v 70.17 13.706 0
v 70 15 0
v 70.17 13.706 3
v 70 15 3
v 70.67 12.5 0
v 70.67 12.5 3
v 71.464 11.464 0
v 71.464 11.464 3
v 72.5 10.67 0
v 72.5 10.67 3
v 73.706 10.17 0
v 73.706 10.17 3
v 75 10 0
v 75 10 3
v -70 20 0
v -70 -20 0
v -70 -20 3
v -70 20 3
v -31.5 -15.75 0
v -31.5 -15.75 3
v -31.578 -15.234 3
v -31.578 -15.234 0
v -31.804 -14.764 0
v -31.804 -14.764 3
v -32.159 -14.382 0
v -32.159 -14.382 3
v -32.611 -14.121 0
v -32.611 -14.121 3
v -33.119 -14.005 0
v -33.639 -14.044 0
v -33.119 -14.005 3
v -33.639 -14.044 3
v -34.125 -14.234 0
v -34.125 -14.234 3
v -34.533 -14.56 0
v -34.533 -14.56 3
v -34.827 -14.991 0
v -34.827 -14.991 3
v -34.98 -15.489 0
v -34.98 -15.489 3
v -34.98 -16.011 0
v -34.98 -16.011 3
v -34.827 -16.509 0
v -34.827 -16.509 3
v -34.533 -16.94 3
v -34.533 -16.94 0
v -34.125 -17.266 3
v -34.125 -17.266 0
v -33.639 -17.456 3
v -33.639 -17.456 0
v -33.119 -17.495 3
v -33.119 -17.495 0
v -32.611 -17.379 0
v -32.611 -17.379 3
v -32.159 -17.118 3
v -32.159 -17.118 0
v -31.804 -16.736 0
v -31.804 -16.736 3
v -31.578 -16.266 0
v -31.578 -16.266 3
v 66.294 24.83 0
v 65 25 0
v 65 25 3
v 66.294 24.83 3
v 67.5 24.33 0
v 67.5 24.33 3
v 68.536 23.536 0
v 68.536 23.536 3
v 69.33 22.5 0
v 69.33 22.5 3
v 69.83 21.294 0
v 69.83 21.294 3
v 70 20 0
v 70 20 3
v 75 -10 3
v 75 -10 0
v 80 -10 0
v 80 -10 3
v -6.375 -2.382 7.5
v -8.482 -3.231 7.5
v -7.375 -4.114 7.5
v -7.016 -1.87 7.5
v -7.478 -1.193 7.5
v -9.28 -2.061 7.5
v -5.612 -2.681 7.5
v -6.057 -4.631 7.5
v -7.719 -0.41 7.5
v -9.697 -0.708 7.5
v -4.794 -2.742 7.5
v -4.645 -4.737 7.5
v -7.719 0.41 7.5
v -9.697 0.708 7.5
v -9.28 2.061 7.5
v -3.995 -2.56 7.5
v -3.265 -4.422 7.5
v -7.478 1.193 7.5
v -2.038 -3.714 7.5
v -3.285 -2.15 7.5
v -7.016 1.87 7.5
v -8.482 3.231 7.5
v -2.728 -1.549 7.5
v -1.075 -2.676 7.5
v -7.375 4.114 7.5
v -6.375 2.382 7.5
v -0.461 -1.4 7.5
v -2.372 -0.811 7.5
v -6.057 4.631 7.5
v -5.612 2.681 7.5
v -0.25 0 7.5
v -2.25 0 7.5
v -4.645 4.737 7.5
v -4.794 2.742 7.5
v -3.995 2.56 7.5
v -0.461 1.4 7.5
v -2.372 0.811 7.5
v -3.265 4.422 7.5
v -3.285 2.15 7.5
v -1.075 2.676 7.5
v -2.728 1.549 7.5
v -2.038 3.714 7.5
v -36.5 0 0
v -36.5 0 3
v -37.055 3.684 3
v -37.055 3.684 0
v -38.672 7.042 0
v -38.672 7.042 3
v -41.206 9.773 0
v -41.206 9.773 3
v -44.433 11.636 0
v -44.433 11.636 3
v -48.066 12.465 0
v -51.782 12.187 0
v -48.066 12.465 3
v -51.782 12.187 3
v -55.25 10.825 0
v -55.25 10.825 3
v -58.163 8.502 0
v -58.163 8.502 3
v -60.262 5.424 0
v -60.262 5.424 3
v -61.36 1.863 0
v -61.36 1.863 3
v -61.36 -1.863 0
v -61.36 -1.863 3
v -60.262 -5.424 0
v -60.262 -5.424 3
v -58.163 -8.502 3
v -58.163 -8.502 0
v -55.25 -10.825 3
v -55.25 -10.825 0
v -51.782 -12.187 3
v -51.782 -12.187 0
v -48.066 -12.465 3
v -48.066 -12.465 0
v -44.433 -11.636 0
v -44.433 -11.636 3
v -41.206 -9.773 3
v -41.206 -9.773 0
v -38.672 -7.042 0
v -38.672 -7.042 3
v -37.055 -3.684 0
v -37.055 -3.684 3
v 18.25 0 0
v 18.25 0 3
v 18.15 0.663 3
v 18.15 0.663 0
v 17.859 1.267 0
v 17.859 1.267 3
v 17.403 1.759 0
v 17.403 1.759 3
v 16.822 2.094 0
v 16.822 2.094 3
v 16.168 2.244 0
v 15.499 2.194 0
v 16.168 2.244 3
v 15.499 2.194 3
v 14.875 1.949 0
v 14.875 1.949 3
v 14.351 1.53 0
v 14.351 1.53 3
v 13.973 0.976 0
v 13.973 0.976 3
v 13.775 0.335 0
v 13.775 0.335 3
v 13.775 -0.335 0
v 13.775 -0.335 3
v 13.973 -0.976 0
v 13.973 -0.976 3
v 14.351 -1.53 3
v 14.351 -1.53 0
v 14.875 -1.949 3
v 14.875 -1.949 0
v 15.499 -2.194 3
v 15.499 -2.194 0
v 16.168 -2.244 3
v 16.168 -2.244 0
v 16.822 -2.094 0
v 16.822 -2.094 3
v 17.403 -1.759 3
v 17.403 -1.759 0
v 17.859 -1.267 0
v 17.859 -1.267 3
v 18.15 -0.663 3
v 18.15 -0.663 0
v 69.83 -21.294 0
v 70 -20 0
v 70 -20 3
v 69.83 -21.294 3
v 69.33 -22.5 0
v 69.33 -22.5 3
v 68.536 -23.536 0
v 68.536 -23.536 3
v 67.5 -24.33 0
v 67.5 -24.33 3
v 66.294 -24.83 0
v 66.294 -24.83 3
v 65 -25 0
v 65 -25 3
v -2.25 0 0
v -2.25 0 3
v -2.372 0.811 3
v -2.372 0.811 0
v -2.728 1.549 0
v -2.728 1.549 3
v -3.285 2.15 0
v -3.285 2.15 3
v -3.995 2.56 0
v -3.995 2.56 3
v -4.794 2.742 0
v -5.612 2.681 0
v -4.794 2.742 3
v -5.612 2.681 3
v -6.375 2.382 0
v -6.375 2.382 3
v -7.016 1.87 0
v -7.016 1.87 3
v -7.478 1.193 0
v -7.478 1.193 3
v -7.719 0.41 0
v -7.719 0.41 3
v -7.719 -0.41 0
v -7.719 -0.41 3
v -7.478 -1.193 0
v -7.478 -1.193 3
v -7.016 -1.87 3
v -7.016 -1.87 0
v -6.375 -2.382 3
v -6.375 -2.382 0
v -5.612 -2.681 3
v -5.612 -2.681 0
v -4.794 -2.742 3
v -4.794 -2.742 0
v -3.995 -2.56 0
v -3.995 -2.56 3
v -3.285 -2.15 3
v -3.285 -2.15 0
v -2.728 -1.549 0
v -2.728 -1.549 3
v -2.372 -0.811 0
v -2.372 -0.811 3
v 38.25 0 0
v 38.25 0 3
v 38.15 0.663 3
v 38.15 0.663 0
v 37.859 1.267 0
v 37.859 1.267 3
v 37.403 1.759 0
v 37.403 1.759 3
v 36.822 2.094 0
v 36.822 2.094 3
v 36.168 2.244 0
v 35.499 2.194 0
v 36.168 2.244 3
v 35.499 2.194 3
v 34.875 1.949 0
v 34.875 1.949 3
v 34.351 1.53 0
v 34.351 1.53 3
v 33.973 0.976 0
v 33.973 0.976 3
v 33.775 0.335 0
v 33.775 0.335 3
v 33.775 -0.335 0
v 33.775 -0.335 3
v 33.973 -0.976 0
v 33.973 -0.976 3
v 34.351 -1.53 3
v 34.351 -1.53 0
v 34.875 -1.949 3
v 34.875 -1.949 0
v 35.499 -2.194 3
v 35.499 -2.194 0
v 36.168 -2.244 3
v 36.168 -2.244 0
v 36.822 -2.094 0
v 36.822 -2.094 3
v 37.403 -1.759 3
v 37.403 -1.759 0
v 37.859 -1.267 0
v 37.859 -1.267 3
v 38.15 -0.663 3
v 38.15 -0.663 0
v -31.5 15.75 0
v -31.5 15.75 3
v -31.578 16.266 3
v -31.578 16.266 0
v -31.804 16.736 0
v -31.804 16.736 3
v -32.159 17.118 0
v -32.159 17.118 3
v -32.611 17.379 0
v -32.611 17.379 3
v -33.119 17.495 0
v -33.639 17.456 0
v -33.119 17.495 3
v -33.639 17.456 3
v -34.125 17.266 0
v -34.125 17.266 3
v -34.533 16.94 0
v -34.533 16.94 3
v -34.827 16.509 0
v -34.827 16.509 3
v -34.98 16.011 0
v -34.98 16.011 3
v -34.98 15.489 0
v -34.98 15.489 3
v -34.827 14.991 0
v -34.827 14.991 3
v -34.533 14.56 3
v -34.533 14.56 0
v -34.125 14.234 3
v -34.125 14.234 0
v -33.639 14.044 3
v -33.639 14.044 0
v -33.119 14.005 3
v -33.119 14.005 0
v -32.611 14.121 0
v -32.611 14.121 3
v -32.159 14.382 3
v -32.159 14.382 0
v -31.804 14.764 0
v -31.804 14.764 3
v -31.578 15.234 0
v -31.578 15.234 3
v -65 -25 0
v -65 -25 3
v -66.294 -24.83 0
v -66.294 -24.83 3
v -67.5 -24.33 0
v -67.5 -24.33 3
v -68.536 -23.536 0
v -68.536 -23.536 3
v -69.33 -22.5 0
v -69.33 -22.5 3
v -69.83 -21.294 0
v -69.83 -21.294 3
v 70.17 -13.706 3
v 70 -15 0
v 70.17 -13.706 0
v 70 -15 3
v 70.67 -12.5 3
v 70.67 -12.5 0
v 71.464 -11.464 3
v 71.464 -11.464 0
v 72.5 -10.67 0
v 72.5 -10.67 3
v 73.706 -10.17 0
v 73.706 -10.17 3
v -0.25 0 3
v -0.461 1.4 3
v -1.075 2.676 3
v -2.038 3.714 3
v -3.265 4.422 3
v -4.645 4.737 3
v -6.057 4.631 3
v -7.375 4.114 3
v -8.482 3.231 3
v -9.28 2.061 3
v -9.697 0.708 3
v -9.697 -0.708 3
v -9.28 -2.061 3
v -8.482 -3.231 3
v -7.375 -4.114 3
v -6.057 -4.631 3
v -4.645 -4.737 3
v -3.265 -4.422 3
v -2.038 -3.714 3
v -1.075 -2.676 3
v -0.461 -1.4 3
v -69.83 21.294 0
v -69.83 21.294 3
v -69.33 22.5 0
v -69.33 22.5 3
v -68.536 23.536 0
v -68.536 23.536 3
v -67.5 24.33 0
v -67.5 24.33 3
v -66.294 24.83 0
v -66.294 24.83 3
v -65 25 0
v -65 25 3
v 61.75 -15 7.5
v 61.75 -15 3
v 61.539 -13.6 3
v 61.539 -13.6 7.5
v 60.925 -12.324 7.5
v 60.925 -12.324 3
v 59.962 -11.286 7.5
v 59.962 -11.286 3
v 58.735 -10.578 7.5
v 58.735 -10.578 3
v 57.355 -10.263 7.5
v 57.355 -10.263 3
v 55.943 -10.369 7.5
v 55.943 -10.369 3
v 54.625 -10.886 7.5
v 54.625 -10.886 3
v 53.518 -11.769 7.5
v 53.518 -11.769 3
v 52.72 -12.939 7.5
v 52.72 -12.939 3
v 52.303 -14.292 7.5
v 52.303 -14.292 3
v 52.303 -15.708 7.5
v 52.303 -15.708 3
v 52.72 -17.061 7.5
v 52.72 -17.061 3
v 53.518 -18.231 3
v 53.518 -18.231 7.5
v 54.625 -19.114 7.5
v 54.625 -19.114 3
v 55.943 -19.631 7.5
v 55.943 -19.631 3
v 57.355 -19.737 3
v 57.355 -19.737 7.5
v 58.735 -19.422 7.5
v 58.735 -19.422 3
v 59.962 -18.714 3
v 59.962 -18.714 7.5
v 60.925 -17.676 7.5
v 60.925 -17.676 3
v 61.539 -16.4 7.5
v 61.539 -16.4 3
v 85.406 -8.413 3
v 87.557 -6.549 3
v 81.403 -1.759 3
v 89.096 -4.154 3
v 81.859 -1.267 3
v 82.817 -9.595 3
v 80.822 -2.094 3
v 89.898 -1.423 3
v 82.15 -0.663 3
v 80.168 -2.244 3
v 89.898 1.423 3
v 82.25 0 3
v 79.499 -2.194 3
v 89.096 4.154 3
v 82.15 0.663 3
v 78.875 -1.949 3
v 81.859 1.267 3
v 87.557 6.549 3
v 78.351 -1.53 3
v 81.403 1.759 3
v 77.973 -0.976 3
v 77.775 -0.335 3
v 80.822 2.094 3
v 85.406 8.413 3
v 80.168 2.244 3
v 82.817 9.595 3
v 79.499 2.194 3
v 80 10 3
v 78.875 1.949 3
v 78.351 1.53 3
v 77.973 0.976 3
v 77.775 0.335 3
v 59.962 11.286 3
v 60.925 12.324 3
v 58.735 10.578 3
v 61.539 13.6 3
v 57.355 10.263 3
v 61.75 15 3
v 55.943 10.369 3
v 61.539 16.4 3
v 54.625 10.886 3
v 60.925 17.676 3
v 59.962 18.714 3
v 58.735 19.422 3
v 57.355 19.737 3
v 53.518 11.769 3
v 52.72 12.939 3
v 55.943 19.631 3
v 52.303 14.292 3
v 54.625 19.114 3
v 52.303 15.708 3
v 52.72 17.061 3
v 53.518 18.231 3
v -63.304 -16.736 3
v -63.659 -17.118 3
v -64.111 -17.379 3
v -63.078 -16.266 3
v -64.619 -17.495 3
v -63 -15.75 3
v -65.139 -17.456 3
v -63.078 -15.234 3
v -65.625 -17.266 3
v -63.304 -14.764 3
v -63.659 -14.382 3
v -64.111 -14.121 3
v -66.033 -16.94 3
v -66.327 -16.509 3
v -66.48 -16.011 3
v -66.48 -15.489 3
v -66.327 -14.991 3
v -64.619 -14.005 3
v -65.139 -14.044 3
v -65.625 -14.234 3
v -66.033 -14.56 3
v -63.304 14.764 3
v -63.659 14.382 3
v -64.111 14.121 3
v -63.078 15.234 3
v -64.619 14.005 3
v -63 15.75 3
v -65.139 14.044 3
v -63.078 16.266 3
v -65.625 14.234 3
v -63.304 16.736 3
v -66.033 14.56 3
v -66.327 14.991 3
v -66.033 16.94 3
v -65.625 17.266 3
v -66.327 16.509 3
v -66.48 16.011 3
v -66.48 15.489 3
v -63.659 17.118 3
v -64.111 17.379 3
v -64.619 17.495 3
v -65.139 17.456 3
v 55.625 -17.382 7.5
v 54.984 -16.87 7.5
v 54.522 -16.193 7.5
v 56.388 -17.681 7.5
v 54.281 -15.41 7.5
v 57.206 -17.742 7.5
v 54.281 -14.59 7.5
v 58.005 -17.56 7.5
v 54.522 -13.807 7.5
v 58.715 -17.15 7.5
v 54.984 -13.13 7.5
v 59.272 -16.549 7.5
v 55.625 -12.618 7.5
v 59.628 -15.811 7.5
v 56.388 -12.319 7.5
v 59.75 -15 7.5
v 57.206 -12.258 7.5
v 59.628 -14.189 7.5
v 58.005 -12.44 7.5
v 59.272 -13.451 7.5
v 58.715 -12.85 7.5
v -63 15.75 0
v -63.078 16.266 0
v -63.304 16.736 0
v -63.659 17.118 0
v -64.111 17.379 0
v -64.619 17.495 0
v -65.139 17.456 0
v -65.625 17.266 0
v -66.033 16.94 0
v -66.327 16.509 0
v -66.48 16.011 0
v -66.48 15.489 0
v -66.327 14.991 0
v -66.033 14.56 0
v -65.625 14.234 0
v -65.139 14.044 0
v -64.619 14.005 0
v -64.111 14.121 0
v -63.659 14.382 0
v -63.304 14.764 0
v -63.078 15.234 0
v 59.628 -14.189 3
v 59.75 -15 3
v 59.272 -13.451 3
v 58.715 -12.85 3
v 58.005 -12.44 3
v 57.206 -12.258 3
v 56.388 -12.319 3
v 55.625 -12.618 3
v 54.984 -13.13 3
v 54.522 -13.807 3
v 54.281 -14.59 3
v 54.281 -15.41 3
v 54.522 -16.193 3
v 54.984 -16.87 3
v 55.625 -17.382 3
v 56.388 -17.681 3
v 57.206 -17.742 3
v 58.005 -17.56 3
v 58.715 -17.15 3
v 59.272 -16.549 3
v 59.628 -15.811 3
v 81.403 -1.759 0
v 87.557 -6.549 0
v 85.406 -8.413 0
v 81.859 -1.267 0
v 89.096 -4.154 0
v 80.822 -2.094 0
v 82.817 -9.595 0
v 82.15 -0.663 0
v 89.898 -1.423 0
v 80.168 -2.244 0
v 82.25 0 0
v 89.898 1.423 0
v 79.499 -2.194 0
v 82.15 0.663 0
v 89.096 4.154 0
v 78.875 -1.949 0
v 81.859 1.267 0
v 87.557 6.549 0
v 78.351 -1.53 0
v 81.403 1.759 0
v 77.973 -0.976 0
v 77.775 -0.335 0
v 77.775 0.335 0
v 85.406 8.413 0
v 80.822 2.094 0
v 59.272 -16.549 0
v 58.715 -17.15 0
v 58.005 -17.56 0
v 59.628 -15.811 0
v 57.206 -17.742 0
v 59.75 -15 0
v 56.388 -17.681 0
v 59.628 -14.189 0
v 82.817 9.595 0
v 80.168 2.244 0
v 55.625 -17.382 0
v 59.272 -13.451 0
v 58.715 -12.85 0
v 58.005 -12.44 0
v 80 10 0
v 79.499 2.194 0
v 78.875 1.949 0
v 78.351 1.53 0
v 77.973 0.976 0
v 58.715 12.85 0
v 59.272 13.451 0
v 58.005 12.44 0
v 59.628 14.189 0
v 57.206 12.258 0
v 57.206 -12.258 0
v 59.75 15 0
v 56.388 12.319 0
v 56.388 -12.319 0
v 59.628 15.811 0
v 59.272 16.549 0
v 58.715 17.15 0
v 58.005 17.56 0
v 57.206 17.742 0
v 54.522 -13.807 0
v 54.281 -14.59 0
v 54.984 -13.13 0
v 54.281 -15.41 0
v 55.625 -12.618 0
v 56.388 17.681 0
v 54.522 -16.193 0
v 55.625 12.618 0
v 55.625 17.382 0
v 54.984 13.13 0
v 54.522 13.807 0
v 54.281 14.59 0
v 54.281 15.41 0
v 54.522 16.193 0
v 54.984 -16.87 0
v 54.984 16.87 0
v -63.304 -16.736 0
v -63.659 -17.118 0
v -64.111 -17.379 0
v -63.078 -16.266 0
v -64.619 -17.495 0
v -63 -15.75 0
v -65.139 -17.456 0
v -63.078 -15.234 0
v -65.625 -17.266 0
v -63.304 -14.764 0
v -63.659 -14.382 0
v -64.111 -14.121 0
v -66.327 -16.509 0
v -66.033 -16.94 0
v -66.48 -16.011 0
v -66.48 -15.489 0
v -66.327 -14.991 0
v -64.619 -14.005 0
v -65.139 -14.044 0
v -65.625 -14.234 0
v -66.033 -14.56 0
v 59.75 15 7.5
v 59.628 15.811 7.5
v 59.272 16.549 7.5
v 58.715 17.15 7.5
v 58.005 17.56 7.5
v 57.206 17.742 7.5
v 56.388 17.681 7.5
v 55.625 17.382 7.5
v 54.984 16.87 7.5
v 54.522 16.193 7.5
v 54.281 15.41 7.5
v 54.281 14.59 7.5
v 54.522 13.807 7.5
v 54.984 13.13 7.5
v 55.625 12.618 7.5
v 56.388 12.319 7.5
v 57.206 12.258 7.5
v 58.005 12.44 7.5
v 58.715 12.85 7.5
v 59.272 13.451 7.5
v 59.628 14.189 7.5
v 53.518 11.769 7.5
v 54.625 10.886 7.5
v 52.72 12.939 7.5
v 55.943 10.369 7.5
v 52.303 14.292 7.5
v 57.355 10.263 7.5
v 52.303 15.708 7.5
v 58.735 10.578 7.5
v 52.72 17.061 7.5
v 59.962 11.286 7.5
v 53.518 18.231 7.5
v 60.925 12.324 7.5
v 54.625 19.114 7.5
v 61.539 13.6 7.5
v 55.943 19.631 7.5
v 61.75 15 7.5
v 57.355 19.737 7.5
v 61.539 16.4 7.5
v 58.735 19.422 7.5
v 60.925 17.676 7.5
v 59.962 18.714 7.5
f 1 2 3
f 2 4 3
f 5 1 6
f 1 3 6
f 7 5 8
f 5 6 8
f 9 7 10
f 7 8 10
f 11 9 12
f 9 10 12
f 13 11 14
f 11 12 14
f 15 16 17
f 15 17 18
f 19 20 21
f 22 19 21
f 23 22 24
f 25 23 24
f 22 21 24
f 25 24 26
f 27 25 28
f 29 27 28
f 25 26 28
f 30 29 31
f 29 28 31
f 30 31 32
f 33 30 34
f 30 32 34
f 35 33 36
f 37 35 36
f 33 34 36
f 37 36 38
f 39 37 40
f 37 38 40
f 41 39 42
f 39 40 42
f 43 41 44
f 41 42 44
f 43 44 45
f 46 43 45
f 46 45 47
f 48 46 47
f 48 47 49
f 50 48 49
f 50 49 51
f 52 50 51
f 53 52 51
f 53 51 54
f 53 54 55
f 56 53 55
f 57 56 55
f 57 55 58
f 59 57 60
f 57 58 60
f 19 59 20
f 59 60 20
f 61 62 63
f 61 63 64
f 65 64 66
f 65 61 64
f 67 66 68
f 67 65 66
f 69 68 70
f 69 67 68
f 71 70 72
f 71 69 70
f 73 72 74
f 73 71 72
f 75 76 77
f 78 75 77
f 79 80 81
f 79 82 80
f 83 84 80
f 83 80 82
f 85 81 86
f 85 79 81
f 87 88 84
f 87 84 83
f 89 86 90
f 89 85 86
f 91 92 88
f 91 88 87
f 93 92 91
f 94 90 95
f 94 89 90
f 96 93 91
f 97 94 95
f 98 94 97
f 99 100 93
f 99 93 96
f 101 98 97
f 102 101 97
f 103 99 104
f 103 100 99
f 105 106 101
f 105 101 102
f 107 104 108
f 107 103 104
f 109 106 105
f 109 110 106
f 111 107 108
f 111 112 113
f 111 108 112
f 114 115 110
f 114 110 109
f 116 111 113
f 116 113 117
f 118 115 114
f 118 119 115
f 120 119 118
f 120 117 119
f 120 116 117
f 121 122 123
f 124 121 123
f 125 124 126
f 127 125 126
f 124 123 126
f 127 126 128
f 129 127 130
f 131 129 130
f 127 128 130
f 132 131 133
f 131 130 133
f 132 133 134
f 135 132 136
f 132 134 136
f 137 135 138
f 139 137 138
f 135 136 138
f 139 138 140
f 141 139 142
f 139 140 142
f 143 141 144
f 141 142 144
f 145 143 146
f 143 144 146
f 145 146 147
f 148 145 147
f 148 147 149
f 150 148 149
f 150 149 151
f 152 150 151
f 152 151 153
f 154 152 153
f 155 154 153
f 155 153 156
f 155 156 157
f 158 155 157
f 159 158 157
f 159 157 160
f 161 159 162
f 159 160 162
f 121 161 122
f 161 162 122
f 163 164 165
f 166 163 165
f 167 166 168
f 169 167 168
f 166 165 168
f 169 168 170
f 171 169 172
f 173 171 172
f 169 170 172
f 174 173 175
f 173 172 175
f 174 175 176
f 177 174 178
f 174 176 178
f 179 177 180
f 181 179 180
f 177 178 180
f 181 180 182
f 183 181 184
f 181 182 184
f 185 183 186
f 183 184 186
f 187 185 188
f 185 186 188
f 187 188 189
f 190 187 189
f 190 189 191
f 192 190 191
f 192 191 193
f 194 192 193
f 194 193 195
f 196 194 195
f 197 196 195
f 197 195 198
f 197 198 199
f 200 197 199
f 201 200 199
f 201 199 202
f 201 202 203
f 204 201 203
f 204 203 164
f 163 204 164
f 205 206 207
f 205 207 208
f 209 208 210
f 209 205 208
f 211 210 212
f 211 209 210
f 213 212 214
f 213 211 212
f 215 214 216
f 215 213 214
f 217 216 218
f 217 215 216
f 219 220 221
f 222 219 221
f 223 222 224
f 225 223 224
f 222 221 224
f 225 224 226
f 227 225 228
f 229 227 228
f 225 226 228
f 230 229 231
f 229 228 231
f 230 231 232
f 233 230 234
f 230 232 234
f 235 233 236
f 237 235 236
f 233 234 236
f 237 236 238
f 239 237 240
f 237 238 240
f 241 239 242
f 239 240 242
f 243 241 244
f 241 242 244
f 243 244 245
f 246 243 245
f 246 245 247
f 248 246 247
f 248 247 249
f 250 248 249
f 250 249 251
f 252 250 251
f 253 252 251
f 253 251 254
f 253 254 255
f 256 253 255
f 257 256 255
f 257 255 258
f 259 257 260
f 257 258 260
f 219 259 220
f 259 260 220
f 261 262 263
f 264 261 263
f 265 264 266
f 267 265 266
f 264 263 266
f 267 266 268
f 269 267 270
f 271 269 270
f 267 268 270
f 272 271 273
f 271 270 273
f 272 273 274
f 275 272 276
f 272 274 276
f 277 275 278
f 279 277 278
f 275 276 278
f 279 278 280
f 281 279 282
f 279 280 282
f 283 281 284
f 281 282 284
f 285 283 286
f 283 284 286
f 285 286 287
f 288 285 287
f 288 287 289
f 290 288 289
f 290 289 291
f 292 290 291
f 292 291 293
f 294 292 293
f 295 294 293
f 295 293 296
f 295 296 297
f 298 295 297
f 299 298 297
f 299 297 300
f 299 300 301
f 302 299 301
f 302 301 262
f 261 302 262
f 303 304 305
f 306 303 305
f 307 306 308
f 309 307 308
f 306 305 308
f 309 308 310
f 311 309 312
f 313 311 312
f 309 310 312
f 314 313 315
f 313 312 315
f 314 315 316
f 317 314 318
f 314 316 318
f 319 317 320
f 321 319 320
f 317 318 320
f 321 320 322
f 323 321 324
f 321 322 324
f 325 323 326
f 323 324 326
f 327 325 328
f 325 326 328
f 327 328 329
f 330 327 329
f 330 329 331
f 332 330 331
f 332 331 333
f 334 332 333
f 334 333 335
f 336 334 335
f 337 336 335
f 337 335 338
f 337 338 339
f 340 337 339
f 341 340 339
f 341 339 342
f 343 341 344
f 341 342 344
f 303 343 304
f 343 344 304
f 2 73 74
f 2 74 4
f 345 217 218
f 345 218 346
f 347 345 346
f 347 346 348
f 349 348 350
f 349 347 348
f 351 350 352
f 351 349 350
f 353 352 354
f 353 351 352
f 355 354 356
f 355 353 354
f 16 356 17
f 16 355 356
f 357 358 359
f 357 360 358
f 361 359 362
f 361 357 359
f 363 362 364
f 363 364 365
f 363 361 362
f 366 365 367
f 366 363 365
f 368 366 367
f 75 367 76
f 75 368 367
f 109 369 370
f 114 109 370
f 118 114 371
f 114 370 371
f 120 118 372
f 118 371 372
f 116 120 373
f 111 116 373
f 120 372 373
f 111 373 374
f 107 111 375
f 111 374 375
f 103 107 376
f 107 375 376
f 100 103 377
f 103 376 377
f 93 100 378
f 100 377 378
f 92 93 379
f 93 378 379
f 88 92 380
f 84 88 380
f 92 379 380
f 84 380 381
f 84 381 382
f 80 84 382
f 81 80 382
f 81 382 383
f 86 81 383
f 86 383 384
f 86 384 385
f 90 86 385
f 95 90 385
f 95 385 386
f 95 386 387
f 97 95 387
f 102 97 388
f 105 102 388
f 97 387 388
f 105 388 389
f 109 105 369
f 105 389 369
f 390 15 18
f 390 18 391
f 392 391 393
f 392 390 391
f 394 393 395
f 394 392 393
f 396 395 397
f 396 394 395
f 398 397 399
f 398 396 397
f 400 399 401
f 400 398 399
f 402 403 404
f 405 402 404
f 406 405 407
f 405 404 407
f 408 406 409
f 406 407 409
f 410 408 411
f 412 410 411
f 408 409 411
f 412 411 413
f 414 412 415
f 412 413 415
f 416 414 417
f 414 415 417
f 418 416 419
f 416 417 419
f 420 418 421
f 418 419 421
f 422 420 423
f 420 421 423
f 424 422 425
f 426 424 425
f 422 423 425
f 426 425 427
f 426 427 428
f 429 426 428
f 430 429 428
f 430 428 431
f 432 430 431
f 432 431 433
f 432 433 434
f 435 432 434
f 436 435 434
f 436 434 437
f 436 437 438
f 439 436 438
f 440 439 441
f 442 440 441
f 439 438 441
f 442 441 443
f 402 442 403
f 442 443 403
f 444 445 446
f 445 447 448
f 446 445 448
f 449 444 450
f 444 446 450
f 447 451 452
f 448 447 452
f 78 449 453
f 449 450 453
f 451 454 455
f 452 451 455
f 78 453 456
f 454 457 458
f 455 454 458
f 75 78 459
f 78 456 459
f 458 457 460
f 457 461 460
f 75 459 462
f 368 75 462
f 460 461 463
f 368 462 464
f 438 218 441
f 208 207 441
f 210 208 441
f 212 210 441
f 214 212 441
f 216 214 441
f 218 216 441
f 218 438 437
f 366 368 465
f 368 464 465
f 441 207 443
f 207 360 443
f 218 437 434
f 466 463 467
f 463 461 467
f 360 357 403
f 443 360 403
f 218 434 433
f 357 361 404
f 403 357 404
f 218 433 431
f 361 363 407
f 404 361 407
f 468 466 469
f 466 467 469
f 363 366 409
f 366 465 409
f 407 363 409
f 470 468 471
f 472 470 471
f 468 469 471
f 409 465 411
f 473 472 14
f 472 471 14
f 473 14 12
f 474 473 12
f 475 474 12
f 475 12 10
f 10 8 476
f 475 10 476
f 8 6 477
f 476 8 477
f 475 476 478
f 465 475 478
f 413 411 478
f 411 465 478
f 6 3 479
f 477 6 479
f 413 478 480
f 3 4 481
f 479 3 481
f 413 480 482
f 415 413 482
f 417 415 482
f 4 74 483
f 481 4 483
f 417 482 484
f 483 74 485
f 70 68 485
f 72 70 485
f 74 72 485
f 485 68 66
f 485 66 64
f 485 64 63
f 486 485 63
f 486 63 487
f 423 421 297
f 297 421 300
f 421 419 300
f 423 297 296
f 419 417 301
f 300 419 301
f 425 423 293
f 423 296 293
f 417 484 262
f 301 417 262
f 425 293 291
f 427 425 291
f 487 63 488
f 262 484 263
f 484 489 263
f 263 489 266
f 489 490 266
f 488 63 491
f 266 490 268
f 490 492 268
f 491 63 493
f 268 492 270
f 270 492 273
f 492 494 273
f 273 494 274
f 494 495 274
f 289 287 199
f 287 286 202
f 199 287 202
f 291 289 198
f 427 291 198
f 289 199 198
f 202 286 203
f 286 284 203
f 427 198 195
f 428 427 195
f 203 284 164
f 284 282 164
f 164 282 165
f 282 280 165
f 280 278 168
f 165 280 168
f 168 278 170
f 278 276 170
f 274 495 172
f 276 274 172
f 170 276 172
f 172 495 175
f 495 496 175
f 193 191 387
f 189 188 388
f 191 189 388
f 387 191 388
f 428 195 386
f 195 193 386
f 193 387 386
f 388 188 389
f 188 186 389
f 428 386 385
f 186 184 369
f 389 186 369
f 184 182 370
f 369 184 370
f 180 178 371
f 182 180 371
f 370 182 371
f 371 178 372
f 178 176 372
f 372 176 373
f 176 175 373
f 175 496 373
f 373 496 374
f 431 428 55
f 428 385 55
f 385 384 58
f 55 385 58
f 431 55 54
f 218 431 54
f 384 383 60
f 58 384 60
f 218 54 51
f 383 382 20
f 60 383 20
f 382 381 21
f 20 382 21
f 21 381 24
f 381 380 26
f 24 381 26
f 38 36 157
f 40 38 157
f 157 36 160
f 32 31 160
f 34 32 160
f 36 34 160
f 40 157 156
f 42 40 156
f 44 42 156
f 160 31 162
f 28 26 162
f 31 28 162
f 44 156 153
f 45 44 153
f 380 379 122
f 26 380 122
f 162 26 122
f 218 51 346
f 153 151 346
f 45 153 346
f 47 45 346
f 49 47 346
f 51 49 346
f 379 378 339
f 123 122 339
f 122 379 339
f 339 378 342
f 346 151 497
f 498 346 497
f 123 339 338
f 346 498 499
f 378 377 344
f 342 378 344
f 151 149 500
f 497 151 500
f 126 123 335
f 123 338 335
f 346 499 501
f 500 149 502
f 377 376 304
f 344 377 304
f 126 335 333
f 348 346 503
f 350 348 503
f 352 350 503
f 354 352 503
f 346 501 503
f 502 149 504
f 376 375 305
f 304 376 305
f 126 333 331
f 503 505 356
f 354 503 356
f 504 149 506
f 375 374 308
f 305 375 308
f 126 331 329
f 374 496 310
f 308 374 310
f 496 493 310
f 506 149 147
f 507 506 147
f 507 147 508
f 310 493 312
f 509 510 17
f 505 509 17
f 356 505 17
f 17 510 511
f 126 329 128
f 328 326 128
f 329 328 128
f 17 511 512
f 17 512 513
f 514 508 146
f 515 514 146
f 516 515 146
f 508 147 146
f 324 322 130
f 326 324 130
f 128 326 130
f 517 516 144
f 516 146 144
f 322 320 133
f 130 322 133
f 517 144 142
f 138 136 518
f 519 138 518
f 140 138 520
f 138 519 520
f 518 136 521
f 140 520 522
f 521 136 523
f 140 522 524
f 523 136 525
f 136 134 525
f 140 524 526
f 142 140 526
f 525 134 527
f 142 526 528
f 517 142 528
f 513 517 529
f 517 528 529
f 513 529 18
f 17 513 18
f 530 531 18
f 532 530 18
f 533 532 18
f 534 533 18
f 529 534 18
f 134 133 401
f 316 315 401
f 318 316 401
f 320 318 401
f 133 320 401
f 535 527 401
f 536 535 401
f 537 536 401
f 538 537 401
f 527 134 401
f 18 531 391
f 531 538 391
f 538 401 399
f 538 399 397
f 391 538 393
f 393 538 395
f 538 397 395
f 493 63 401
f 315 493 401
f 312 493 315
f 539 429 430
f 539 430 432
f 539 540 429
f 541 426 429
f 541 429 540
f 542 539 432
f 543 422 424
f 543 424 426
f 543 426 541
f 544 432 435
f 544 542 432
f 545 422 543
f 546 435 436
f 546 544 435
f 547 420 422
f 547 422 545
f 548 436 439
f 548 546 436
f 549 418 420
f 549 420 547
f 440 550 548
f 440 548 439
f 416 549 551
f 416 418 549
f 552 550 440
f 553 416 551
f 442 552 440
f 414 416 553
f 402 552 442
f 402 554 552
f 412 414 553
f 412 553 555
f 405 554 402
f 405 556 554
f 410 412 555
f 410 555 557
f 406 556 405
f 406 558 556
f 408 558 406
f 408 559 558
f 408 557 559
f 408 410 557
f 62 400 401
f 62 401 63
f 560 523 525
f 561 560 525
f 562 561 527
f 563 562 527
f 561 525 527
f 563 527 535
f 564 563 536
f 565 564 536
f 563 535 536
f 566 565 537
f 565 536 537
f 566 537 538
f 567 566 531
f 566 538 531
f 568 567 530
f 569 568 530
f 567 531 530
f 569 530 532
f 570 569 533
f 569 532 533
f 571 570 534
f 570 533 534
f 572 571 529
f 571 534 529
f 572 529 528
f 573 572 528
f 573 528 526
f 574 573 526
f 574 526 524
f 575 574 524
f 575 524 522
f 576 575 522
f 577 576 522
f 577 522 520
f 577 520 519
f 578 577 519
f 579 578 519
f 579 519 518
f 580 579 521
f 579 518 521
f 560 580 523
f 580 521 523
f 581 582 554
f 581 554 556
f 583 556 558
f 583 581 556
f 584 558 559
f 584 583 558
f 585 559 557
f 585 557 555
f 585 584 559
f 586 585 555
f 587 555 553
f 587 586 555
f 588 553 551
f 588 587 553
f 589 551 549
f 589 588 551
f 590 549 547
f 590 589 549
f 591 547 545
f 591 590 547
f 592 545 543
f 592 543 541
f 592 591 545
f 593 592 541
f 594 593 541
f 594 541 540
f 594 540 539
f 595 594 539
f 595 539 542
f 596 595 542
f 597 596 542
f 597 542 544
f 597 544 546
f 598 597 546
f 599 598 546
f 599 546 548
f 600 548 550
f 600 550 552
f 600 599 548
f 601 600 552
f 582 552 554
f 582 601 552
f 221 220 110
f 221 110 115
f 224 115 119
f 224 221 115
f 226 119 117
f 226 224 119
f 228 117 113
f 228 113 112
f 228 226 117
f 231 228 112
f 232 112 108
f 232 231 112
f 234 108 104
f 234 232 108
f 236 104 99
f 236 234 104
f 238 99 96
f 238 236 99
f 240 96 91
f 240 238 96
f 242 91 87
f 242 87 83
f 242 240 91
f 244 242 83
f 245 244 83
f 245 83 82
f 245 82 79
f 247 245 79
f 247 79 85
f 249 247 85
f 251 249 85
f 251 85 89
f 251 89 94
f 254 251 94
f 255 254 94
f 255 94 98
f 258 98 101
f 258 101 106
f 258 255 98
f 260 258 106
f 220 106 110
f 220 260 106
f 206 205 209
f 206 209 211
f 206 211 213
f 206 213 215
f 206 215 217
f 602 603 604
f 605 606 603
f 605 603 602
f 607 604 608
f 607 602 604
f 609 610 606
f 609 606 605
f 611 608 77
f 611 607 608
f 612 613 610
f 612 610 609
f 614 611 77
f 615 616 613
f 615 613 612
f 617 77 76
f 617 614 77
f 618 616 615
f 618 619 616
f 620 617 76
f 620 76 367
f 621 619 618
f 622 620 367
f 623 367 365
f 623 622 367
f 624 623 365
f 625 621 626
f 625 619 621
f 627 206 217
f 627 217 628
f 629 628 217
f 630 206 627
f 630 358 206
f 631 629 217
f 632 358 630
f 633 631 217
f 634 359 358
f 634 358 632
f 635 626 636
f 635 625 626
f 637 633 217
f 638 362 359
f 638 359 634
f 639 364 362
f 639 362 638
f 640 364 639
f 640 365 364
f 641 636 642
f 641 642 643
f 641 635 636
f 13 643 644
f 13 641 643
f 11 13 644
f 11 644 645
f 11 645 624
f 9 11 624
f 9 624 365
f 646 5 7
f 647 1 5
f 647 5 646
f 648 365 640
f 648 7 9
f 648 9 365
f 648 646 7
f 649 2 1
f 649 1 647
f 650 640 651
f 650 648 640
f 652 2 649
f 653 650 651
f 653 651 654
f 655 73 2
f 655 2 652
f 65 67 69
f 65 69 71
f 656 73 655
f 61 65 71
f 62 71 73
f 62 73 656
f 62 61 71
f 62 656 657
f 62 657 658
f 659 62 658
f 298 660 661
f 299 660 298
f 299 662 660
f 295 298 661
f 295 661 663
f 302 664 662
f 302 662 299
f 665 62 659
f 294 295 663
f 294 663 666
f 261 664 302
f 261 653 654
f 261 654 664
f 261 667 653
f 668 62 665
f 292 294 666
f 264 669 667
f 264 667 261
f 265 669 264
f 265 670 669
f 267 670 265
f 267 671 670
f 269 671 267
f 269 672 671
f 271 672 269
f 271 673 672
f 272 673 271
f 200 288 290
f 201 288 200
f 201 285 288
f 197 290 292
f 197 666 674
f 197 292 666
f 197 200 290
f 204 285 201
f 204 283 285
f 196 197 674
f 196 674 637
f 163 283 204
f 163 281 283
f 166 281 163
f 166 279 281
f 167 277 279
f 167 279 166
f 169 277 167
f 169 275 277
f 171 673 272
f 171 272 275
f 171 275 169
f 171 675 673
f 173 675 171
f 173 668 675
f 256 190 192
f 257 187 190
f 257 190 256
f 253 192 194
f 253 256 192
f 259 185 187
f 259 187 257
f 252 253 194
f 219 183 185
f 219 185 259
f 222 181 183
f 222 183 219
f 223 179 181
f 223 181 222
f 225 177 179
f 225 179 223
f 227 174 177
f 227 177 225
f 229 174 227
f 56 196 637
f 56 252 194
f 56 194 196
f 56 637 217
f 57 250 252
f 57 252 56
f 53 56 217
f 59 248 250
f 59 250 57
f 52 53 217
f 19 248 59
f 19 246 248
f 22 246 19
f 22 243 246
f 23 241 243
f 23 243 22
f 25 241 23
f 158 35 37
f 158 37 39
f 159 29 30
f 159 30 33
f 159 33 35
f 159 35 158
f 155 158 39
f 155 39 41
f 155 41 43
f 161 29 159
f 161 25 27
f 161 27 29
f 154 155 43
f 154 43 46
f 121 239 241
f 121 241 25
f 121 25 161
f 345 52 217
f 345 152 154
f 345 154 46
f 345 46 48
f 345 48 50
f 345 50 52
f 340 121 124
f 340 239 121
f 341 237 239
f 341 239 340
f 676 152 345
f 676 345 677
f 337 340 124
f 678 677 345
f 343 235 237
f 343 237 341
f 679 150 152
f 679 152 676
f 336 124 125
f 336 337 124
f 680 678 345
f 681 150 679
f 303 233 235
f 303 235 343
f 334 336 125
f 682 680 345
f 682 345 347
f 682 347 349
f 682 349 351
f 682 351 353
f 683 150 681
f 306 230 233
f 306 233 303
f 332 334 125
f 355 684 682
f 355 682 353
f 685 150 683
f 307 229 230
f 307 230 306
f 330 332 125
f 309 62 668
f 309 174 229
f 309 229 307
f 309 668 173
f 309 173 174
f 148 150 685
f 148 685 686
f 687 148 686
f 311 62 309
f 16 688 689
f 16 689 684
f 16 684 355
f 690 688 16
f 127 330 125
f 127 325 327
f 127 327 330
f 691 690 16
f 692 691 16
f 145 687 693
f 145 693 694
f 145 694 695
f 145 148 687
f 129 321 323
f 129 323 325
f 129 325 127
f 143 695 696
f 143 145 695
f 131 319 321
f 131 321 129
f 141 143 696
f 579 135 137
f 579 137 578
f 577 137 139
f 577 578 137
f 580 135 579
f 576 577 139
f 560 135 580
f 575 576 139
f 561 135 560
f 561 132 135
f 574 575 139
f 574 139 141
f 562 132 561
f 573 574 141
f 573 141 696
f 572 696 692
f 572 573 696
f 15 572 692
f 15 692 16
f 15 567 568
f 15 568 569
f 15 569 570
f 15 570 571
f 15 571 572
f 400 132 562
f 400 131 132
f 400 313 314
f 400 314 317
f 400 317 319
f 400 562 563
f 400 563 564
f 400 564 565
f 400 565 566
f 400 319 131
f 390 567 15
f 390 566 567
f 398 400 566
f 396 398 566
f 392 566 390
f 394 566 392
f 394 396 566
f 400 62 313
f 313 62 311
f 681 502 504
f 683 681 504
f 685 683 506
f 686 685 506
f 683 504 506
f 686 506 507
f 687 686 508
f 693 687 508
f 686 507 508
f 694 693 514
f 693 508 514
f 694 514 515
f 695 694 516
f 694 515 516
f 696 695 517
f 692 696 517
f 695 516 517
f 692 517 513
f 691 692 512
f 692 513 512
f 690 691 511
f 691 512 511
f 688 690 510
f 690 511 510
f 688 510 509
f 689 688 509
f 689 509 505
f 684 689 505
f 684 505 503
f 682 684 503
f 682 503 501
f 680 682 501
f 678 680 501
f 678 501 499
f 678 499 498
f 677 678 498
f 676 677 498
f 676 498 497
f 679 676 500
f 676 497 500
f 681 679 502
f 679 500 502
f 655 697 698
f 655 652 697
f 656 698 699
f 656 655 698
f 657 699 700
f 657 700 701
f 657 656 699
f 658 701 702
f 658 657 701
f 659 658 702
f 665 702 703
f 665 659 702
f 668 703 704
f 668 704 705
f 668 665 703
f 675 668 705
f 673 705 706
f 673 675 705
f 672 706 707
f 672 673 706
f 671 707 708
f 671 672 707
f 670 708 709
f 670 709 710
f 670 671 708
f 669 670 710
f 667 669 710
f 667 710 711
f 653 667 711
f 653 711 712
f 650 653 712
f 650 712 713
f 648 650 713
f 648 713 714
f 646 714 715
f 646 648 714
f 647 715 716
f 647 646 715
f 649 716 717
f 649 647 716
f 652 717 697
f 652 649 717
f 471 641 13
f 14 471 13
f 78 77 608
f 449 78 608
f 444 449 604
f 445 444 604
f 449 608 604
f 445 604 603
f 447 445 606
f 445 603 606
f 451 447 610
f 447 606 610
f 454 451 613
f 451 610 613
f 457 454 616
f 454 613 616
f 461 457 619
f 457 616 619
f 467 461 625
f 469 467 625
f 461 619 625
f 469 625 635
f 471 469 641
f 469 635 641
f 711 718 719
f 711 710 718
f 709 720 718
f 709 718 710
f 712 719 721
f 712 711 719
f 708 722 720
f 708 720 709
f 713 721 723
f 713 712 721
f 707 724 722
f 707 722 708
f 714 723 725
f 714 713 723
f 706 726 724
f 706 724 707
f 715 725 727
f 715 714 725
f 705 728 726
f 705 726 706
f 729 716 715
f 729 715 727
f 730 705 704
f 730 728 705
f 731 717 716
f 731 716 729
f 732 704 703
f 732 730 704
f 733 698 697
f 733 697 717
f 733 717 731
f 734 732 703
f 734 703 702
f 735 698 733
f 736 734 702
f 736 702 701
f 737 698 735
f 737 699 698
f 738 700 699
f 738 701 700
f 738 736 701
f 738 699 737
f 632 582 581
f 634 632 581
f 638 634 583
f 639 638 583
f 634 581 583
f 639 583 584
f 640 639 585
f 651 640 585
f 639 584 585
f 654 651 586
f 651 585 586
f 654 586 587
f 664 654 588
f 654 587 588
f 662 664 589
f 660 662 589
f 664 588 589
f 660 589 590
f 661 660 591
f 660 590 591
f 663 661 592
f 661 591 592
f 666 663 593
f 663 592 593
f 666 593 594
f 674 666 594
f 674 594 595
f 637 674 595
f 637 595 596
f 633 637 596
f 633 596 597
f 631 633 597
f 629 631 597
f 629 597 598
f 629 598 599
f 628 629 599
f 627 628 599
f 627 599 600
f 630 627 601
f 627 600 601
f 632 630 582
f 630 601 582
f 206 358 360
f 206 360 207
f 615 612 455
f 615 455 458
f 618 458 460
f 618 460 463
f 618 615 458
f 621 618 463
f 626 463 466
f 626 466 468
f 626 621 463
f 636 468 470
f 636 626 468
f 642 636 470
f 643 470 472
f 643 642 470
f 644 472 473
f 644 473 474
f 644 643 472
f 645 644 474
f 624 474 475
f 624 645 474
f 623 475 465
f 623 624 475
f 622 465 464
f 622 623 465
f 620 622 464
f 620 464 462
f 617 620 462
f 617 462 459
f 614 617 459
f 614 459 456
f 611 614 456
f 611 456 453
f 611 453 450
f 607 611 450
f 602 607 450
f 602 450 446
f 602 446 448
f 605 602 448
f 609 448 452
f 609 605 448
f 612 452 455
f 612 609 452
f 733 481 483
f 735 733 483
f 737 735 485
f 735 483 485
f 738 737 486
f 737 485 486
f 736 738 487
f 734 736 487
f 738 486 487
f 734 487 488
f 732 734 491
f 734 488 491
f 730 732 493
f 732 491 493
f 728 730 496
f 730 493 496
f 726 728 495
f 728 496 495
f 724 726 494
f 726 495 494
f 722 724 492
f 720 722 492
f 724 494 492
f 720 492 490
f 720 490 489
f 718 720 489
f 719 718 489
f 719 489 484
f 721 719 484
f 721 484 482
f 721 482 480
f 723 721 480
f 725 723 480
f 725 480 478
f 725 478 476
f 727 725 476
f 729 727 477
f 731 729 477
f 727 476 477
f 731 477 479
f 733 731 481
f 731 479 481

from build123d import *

# Parameters (mm, degrees)
BOSS_EXTRUDE1_DEPTH = 3
SKETCH2_R           = 1.75
SKETCH2_R_2         = 12.5
SKETCH2_R_3         = 2.75
CUT_EXTRUDE1_DEPTH  = 3
SKETCH3_R           = 4.75
SKETCH3_R_2         = 2.75
BOSS_EXTRUDE2_DEPTH = 4.5
SKETCH4_R           = 2.25
BOSS_EXTRUDE3_DEPTH = 3
FILLET1_R           = 5
SKETCH5_R           = 2.25
CUT_EXTRUDE2_DEPTH  = 4


with BuildPart() as part:
    # Sketch1 → Boss-Extrude1 (new body)
    with BuildSketch(Plane.XY):
        with BuildLine():
            Line((-65, 25), (65, 25))
            ThreePointArc((65, 25), (68.535533906, 23.535533906), (70, 20))
            Line((70, 20), (70, -20))
            ThreePointArc((70, -20), (68.535533906, -23.535533906), (65, -25))
            Line((65, -25), (-65, -25))
            ThreePointArc((-65, -25), (-68.535533906, -23.535533906), (-70, -20))
            Line((-70, -20), (-70, 20))
            ThreePointArc((-70, 20), (-68.535533906, 23.535533906), (-65, 25))
        make_face()
    extrude(amount=BOSS_EXTRUDE1_DEPTH)

    # Sketch2 → Cut-Extrude1 (cut)
    with BuildSketch(Plane.XY.offset(3)):
        with Locations((-64.75, 15.75)):
            Circle(SKETCH2_R)
        with Locations((-33.25, 15.75)):
            Circle(SKETCH2_R)
        with Locations((-64.75, -15.75)):
            Circle(SKETCH2_R)
        with Locations((-33.25, -15.75)):
            Circle(SKETCH2_R)
        with Locations((-49, 0)):
            Circle(SKETCH2_R_2)
        with Locations((57, 15)):
            Circle(SKETCH2_R_3)
        with Locations((57, -15)):
            Circle(SKETCH2_R_3)
        with Locations((-5, 0)):
            Circle(SKETCH2_R_3)
    extrude(amount=-CUT_EXTRUDE1_DEPTH, mode=Mode.SUBTRACT)

    # Sketch3 → Boss-Extrude2 (add)
    with BuildSketch(Plane.XY.offset(3)):
        with Locations((57, 15)):
            Circle(SKETCH3_R)
        with Locations((57, 15)):
            Circle(SKETCH3_R_2, mode=Mode.SUBTRACT)
        with Locations((-5, 0)):
            Circle(SKETCH3_R)
        with Locations((-5, 0)):
            Circle(SKETCH3_R_2, mode=Mode.SUBTRACT)
        with Locations((57, -15)):
            Circle(SKETCH3_R)
        with Locations((57, -15)):
            Circle(SKETCH3_R_2, mode=Mode.SUBTRACT)
    extrude(amount=BOSS_EXTRUDE2_DEPTH)

    # Sketch4 → Boss-Extrude3 (add)
    with BuildSketch(Plane.XY):
        with BuildLine():
            Line((70, 10), (70, -10))
            Line((70, -10), (80, -10))
            ThreePointArc((80, -10), (90, 0), (80, 10))
            Line((80, 10), (70, 10))
        make_face()
        with Locations((80, 0)):
            Circle(SKETCH4_R, mode=Mode.SUBTRACT)
    extrude(amount=BOSS_EXTRUDE3_DEPTH)

    # Fillet1
    fillet1_edges = [part.edges().sort_by_distance(p)[0] for p in [
        (70, -10, 1.5),
        (70, 10, 1.5),
    ]]
    fillet(fillet1_edges, radius=FILLET1_R)

    # Sketch5 → Cut-Extrude2 (cut, through all)
    with BuildSketch(Plane.XY.offset(3)):
        with Locations((16, 0)):
            Circle(SKETCH5_R)
        with Locations((36, 0)):
            Circle(SKETCH5_R)
    extrude(amount=-CUT_EXTRUDE2_DEPTH, mode=Mode.SUBTRACT)


solid = part.part
